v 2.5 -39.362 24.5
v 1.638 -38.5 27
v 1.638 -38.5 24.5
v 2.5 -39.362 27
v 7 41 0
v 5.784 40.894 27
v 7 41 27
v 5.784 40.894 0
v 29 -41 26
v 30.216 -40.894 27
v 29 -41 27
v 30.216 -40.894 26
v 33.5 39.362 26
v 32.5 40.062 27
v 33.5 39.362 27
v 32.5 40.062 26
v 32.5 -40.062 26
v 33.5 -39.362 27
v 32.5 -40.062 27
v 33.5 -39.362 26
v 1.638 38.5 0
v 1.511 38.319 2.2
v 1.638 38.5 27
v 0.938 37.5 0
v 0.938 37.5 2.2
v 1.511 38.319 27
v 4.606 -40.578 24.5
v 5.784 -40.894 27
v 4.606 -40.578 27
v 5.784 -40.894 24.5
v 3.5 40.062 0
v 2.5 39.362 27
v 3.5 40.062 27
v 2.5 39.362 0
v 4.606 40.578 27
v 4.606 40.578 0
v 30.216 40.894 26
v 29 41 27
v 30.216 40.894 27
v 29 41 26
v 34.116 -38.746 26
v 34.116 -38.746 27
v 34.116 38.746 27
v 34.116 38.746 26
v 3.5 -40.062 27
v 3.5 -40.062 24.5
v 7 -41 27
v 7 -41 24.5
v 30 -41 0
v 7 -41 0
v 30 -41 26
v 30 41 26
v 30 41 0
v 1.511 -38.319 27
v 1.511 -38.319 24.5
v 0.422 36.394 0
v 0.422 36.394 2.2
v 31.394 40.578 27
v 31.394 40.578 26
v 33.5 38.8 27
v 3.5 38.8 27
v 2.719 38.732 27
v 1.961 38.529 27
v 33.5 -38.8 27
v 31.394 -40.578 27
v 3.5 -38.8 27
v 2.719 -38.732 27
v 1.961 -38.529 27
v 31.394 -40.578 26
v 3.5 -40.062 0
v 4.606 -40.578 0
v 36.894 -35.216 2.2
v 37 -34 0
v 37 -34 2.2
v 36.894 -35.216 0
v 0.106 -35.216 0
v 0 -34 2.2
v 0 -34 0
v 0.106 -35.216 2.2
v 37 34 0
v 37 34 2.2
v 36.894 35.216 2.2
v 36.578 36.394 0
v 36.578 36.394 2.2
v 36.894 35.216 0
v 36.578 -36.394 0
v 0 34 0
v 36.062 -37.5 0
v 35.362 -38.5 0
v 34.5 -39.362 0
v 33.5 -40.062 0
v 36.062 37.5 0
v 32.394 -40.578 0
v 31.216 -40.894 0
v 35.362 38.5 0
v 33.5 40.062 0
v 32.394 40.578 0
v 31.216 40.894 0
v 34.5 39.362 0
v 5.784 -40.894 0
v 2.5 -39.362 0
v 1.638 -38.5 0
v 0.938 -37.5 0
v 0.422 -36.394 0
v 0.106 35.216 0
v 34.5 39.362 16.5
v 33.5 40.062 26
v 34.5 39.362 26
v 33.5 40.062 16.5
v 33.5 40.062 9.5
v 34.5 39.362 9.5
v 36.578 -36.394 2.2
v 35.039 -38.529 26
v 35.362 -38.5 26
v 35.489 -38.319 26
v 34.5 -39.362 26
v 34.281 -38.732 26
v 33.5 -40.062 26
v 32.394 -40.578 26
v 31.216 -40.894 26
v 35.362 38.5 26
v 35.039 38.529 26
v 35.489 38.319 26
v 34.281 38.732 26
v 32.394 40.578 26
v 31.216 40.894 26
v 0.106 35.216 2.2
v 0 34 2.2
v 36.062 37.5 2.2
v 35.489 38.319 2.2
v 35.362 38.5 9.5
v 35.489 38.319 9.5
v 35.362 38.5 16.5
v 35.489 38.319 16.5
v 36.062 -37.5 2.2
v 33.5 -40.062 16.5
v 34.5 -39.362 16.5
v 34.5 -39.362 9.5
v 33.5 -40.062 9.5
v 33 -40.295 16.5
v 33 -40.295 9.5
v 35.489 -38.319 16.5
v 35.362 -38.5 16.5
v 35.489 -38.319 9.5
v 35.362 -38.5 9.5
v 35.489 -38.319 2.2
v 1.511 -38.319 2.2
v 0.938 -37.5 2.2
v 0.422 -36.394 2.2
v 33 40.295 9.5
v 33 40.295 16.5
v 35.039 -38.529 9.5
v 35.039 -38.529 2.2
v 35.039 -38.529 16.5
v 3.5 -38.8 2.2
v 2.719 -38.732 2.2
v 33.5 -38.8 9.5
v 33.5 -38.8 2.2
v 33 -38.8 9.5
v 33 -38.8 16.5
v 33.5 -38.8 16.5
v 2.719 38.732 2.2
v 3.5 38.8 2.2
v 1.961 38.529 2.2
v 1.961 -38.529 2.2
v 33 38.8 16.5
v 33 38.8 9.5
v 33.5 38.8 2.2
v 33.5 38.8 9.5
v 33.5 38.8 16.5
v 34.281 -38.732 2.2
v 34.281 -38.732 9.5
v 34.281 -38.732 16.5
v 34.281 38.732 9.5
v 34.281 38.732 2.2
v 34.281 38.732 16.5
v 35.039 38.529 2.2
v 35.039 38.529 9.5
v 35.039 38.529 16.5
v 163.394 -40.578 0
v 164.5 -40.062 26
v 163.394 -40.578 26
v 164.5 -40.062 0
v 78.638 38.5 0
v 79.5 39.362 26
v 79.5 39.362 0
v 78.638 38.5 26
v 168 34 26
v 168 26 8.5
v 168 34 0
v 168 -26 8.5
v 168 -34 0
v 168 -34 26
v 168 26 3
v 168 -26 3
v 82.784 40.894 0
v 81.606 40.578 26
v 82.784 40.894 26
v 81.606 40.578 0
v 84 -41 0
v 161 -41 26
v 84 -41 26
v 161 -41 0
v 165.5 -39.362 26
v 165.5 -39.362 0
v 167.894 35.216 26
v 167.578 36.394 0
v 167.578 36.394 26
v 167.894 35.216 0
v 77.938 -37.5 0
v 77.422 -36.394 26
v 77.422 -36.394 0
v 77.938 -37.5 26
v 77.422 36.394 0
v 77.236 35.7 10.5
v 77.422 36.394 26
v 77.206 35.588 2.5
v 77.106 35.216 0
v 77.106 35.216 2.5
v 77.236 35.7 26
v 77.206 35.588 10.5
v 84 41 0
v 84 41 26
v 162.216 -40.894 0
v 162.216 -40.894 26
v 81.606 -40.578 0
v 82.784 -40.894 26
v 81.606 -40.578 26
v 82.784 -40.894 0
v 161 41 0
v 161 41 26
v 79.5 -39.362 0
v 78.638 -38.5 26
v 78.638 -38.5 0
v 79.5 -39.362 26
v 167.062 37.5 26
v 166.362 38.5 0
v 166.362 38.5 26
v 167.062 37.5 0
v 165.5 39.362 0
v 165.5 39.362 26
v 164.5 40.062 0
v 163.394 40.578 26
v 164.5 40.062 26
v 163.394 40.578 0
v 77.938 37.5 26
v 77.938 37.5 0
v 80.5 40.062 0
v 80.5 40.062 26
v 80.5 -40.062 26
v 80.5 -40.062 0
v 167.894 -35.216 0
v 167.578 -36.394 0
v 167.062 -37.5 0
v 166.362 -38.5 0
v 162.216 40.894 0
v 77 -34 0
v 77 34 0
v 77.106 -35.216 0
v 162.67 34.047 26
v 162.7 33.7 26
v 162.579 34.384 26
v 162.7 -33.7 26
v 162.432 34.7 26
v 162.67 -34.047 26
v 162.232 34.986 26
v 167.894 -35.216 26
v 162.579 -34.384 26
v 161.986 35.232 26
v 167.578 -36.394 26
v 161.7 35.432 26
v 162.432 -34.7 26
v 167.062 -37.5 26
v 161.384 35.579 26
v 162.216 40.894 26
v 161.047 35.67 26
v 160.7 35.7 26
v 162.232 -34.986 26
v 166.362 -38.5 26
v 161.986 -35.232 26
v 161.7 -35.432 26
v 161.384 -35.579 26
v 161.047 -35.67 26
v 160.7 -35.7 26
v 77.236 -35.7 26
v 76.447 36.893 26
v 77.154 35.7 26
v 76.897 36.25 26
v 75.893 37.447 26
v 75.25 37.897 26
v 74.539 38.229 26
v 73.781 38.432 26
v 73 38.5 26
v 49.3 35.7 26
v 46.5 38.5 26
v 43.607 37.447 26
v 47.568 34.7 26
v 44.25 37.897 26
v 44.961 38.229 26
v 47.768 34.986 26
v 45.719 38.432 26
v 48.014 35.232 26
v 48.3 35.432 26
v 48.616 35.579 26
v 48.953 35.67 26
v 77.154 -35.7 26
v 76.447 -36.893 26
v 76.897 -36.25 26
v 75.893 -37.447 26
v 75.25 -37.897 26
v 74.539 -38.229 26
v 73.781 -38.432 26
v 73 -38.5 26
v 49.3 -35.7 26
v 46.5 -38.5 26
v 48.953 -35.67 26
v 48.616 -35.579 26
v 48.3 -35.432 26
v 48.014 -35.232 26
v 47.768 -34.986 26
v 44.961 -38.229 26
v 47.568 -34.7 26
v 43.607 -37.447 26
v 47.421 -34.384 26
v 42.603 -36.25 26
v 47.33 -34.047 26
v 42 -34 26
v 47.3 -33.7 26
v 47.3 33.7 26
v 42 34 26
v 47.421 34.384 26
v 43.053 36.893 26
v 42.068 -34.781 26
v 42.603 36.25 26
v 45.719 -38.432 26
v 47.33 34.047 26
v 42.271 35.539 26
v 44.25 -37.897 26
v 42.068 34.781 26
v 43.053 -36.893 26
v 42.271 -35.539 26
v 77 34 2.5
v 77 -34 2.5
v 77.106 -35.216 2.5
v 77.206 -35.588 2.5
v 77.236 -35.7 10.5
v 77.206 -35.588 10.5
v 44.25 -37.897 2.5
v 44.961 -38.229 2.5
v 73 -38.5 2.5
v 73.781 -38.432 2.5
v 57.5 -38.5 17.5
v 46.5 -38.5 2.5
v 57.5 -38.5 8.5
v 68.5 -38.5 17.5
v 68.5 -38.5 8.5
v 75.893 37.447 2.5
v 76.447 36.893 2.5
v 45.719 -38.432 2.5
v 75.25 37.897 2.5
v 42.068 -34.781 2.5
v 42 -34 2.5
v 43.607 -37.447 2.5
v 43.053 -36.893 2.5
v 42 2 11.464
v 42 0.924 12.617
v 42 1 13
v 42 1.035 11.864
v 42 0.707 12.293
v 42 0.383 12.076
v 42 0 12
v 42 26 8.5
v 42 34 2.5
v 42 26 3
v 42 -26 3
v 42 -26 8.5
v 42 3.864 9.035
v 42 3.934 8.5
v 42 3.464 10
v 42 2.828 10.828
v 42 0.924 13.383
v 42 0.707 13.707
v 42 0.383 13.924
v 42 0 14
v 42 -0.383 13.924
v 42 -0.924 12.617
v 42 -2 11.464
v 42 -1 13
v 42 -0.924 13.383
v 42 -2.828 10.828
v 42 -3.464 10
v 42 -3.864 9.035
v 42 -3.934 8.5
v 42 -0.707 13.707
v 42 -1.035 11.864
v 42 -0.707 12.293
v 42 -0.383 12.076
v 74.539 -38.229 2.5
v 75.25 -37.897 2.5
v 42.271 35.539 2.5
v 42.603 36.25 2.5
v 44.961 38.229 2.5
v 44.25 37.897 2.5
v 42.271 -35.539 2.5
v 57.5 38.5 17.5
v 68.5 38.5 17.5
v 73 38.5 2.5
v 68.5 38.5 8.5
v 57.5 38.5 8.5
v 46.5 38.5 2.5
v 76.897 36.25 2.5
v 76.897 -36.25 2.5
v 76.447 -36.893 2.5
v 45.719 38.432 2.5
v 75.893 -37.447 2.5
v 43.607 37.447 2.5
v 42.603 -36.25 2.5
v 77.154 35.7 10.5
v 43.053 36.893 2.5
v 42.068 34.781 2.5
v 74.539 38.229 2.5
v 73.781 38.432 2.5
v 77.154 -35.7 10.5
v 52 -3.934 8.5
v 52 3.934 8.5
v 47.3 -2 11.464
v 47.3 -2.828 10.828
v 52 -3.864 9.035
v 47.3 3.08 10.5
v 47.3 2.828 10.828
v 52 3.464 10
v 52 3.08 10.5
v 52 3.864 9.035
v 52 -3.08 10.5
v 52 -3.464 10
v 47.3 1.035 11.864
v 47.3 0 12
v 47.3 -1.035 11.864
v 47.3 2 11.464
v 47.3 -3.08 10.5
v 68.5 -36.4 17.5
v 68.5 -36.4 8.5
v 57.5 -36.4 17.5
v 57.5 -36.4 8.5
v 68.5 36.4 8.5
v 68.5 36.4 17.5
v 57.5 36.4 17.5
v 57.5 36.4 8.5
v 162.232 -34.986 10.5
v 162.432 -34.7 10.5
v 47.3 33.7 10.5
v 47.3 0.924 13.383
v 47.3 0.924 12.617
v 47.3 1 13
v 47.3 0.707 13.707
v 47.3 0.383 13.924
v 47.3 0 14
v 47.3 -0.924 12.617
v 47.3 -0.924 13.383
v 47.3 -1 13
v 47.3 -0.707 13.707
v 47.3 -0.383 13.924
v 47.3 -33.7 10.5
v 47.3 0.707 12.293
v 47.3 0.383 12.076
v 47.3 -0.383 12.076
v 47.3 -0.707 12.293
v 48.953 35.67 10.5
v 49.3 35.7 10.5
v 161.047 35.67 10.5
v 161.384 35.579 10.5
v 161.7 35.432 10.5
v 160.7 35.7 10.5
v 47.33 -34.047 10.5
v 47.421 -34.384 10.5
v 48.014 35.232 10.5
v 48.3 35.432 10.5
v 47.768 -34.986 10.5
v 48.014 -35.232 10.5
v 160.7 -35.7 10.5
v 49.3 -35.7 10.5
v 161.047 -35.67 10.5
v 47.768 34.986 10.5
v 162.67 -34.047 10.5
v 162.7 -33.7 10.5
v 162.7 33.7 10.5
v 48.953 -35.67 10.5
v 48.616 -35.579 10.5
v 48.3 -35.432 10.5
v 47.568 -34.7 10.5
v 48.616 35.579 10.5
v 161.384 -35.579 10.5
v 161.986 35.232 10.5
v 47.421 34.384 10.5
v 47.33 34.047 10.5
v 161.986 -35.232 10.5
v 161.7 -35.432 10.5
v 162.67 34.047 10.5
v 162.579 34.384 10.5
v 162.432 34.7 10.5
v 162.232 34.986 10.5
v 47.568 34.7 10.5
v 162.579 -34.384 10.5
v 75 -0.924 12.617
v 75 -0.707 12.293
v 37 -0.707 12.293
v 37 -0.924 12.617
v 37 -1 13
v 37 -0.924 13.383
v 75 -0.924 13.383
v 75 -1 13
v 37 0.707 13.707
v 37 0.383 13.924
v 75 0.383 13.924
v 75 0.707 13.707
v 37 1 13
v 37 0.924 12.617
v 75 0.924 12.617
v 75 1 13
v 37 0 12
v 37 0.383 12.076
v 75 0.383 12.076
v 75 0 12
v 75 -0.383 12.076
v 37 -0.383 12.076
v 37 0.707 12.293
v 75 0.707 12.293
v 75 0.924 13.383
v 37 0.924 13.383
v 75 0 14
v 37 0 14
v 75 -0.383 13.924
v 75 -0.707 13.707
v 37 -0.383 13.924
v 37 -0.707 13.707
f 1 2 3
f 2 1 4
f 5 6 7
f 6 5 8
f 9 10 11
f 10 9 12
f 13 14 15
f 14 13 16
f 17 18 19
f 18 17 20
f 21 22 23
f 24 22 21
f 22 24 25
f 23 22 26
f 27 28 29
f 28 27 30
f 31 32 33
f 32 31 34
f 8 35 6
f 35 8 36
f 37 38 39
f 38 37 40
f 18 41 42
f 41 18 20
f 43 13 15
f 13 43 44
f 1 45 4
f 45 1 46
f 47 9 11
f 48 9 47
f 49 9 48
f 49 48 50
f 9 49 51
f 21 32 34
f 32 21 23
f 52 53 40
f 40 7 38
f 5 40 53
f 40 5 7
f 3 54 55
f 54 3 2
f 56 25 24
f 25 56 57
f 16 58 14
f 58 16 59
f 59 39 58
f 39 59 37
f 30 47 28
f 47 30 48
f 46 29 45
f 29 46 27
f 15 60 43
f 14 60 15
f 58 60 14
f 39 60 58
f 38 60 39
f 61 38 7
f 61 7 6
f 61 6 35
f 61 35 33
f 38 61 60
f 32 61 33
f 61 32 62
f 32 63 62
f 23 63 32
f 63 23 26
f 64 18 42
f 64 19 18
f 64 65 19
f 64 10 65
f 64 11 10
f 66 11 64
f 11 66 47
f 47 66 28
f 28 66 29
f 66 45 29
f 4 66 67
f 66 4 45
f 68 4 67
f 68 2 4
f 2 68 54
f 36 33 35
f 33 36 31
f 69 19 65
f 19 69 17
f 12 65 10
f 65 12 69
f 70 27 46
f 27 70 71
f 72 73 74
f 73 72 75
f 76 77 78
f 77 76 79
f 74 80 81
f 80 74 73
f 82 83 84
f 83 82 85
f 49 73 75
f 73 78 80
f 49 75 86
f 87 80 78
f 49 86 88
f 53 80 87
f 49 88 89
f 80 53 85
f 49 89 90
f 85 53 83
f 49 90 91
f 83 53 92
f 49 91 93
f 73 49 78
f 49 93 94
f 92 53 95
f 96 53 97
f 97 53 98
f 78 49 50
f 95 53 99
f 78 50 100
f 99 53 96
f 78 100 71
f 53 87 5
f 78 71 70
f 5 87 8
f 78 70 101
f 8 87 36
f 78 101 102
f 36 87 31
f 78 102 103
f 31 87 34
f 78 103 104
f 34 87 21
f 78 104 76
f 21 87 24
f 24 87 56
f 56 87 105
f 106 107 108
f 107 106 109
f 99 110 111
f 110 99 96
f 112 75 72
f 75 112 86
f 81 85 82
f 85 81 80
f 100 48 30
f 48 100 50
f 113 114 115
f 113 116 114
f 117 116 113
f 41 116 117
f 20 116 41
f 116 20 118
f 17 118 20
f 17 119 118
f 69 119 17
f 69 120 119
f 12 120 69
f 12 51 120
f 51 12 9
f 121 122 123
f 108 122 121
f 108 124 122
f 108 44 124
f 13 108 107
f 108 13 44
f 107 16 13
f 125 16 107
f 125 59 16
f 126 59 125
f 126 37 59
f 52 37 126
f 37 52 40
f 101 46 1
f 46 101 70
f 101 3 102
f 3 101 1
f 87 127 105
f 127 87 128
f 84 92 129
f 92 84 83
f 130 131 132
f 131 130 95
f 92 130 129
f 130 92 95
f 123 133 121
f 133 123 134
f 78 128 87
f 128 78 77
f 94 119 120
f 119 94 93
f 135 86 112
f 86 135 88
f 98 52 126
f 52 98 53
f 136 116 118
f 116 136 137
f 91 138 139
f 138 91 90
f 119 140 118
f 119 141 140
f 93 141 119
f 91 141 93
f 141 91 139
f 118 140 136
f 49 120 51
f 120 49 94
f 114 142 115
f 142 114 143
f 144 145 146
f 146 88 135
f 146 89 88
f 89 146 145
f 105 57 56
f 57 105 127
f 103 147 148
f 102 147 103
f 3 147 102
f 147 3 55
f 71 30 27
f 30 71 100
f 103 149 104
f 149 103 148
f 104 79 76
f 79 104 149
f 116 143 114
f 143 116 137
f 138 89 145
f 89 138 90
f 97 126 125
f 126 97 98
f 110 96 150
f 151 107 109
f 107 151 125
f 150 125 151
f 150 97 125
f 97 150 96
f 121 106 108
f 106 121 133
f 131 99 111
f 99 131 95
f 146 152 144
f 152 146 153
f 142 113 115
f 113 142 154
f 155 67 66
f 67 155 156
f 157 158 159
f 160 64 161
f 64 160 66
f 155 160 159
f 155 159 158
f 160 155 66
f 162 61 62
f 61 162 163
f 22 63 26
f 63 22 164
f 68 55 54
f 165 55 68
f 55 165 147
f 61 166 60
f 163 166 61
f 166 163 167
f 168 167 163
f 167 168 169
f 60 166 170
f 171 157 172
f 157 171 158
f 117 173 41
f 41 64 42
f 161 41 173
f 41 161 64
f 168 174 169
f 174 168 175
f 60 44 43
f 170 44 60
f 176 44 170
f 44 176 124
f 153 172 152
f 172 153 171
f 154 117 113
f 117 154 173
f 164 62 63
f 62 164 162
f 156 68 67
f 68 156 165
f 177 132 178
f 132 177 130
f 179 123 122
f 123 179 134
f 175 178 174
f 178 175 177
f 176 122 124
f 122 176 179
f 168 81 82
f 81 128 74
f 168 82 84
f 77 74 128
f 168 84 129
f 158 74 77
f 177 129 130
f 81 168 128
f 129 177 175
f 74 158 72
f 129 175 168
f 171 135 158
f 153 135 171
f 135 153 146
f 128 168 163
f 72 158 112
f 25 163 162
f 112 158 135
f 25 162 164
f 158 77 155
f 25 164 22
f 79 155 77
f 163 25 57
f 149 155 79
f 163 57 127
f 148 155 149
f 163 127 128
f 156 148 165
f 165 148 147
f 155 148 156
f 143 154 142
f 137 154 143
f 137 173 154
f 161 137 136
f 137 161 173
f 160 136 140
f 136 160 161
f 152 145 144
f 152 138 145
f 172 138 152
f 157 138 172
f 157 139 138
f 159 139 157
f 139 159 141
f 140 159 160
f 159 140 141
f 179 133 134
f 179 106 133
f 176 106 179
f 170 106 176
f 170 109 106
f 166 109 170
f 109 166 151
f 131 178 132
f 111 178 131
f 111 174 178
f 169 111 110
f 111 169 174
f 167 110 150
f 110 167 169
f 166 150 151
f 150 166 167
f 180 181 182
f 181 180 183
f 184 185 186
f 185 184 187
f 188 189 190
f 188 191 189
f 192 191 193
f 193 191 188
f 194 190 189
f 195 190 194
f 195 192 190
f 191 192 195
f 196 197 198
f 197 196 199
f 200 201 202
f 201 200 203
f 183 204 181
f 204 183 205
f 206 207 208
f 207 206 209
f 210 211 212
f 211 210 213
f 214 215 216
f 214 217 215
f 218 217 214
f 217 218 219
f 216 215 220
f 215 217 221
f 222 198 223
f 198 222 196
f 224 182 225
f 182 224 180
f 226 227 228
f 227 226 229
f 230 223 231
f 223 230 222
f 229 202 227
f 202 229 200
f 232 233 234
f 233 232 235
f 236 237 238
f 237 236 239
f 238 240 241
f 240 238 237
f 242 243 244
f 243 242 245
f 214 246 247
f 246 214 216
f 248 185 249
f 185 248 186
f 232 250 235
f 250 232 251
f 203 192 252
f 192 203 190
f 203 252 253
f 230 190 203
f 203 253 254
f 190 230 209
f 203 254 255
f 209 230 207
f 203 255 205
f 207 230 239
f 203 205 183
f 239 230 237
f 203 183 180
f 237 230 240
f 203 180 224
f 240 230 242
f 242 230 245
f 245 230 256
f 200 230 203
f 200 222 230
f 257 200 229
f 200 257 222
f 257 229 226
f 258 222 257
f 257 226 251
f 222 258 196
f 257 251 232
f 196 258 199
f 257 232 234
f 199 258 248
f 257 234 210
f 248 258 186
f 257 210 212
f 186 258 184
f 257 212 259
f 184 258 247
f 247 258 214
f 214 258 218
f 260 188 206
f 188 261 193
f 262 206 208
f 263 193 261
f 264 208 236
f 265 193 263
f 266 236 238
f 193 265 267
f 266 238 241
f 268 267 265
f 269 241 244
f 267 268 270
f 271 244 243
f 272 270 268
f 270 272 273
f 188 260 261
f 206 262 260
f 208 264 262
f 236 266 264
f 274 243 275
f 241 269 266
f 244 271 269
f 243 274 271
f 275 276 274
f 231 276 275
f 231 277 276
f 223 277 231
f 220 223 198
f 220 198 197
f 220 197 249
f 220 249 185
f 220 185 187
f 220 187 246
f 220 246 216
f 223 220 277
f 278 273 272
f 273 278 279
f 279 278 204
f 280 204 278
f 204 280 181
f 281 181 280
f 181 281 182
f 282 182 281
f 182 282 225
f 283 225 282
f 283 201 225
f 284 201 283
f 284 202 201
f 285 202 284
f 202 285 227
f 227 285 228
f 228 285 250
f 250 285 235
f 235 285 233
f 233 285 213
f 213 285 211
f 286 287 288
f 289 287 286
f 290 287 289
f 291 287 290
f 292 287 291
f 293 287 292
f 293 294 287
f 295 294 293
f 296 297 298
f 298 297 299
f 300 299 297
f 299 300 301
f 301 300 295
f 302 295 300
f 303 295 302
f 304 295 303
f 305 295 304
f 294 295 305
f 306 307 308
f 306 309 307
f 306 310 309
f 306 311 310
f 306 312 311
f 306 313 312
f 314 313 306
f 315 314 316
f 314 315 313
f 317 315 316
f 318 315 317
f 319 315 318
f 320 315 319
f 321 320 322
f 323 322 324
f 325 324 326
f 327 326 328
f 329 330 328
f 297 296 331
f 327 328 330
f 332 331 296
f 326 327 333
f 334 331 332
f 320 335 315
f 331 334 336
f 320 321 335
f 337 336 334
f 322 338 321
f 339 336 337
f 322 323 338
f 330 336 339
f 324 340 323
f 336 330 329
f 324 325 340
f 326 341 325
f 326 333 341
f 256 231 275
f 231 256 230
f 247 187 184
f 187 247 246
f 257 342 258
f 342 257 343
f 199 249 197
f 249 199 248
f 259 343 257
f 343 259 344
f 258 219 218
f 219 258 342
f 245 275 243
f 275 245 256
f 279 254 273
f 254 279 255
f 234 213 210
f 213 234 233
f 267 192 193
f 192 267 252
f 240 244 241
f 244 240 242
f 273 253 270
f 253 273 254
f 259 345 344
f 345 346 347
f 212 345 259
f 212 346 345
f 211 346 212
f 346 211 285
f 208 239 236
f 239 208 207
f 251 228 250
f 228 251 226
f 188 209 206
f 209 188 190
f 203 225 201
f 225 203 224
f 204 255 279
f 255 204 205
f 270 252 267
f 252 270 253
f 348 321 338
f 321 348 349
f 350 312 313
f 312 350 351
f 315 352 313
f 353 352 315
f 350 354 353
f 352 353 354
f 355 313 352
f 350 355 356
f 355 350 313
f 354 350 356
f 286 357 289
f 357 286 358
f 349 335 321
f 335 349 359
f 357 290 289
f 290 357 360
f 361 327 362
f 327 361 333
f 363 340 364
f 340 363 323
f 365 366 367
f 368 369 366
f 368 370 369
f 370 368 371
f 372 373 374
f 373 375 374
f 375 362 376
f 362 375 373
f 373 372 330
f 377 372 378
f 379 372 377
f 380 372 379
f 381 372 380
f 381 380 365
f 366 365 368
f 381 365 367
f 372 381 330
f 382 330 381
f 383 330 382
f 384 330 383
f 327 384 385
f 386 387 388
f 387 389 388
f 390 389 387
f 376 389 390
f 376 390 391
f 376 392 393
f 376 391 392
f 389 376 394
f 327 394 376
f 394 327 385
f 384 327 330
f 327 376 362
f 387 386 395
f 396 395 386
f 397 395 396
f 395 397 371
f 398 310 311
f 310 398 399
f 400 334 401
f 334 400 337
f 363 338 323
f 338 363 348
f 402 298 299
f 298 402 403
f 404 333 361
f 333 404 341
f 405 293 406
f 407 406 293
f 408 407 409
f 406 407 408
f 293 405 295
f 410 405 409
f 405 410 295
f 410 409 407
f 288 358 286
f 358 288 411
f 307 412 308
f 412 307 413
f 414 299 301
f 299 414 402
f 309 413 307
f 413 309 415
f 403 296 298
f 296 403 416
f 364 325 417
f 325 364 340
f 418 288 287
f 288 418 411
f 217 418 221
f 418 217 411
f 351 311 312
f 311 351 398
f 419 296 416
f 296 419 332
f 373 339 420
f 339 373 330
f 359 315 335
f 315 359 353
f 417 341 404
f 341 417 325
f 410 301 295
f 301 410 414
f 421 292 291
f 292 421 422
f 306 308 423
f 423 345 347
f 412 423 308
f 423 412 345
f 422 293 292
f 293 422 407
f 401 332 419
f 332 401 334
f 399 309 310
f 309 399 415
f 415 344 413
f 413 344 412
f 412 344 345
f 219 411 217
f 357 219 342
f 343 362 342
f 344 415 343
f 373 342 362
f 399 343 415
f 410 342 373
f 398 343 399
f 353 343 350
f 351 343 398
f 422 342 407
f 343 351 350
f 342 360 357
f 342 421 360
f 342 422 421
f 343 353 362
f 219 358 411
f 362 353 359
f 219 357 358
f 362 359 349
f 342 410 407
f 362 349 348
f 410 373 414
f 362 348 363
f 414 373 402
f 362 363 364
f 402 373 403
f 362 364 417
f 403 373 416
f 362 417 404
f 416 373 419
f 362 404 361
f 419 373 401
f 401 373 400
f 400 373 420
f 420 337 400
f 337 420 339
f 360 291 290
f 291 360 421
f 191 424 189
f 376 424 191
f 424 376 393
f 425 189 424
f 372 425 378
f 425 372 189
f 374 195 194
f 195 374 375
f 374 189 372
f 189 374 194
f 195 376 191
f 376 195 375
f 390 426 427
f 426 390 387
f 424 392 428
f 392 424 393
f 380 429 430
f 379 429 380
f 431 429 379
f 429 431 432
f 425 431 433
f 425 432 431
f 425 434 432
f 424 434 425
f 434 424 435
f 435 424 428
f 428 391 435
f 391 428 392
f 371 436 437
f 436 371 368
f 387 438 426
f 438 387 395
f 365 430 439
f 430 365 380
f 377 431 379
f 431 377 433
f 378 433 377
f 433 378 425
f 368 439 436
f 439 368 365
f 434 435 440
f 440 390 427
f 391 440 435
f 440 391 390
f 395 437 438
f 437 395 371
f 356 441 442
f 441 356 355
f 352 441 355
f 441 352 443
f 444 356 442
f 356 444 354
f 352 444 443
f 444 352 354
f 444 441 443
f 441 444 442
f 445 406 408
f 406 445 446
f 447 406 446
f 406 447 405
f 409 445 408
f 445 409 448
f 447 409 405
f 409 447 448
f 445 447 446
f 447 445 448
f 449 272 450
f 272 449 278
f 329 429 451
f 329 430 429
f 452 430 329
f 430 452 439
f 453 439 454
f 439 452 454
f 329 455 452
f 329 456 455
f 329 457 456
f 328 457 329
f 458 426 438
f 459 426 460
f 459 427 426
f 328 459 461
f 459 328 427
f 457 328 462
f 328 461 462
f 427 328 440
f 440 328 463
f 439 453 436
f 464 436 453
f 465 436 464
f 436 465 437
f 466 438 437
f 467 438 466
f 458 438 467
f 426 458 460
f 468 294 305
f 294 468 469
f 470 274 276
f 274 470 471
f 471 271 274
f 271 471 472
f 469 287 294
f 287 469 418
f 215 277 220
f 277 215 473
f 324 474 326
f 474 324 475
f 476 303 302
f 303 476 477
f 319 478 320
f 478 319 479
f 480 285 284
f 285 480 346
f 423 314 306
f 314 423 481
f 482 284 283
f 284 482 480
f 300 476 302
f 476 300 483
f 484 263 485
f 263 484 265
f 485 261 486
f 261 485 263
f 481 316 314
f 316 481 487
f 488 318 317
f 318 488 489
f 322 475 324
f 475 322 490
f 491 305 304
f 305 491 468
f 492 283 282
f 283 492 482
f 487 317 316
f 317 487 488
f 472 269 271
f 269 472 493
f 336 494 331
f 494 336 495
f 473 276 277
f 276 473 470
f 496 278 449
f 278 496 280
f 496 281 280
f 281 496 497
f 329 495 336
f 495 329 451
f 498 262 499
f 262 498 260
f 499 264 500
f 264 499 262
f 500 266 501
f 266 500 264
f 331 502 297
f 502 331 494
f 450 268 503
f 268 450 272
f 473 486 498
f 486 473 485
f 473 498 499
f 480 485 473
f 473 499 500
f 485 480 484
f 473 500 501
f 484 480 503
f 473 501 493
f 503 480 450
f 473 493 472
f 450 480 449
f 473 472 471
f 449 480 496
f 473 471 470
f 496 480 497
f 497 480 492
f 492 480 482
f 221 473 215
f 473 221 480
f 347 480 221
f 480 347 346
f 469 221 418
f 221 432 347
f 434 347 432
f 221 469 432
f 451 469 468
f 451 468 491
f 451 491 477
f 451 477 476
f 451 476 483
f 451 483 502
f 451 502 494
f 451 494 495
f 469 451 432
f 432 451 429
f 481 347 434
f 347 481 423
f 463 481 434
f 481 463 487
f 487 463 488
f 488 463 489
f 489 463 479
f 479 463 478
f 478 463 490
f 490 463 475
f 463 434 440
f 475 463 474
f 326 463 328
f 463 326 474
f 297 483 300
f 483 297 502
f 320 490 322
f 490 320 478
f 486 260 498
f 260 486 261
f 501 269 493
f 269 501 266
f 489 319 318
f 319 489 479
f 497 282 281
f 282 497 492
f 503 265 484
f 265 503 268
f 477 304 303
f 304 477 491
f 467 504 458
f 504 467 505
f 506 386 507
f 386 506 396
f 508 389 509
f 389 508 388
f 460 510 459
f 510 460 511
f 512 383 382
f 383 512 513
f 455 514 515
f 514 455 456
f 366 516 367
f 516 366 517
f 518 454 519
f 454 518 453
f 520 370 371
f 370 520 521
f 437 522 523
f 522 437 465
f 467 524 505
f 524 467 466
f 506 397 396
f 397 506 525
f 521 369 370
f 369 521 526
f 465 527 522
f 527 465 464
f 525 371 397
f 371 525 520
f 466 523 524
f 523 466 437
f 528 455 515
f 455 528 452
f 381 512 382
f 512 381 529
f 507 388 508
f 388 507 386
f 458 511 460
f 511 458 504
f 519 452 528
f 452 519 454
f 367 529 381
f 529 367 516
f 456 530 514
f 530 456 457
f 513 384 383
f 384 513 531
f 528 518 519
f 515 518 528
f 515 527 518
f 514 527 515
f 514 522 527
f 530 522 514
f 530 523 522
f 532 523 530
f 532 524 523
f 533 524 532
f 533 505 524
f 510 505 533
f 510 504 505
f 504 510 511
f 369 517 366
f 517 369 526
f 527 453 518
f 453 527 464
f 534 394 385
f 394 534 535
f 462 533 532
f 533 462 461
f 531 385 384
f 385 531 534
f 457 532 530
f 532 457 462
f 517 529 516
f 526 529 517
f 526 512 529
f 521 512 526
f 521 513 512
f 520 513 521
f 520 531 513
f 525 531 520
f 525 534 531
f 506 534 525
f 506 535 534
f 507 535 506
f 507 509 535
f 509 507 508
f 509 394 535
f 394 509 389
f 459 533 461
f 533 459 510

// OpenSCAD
$fn = 36;

// Parámetros de la cápsula
pod_l = 126.0;
pod_w = 82.0;
pod_base_h = 26.0;
pod_r = 7.0;
pod_wall = 2.8;

// Parámetros de la cuna TPU
cradle_depth = 35.0;
cradle_wall = 2.5;
cradle_floor = 2.5;
cradle_tol = 0.3; // Holgura precisa para TPU sobre ASA

// Parámetros del Click / Snap-Fit
click_x = 16.0;      // Posición a lo largo del bolsillo (mm)
click_l = 10.0;      // Largo del diente en X (mm)
click_h = 8.0;       // Altura del diente en Z (mm)
click_depth = 1.8;   // Saliente del diente de traba hacia adentro (mm)
click_z = 13.0;      // Centrado verticalmente a media altura

// Túnel pasacorreas
strap_slot_w = 52.0;
strap_slot_h = 5.5;
tunnel_t = 3.0;

module r_box(l, w, h, r) {
    hull() {
        translate([r, r, 0]) cylinder(r=r, h=h);
        translate([l-r, r, 0]) cylinder(r=r, h=h);
        translate([r, w-r, 0]) cylinder(r=r, h=h);
        translate([l-r, w-r, 0]) cylinder(r=r, h=h);
    }
}

// Diente de traba en cuña (Entrada suave en rampa hacia X=0, tope recto anti-extracción)
module snap_wedge() {
    hull() {
        // Cara trasera de retención recta (tope en X=0 local)
        translate([0, 0, -click_h/2])
            cube([0.5, click_depth, click_h]);
        // Cima redondeada del diente de traba
        translate([2.5, click_depth - 0.4, -click_h/2])
            cube([1.0, 0.4, click_h]);
        // Rampa suave hacia la boca de entrada (en X=click_l)
        translate([click_l, 0, -click_h/2 + 0.5])
            cube([0.5, 0.3, click_h - 1.0]);
    }
}

// CUNA EN TPU CON DIENTES DE CLICK Y LABIO TIPO FUNDA DE CELULAR
module tpu_cradle_snap_fit() {
    color([0.18, 0.20, 0.22]) // TPU Grafito
    difference() {
        union() {
            // Cuerpo exterior de la cuna
            translate([0, -pod_w/2, 0])
                r_box(cradle_depth + 2.0, pod_w, pod_base_h, pod_r);

            // Labio superior elástico tipo funda de celular (sujeta el borde superior del case)
            translate([0, -pod_w/2, pod_base_h - 1.5]) {
                difference() {
                    r_box(cradle_depth + 1.0, pod_w, 2.5, pod_r);
                    translate([-2, cradle_wall + 1.2, -1])
                        r_box(cradle_depth + 5.0, pod_w - 2*(cradle_wall + 1.2), 5.0, max(1, pod_r - cradle_wall));
                }
            }

            // Dientes de click interiores en las paredes laterales de TPU
            // Diente lateral 1 (en pared Y = -pod_w/2 + cradle_wall)
            translate([click_x, -pod_w/2 + cradle_wall - cradle_tol, click_z])
                snap_wedge();

            // Diente lateral 2 (en pared Y = +pod_w/2 - cradle_wall)
            translate([click_x, pod_w/2 - cradle_wall + cradle_tol, click_z])
                mirror([0, 1, 0]) snap_wedge();
        }

        // Cavidad interior donde entra el case
        translate([-1.0, -pod_w/2 + cradle_wall - cradle_tol, cradle_floor - cradle_tol])
            r_box(cradle_depth + 4.0, pod_w - 2*(cradle_wall - cradle_tol), 
                  pod_base_h + 5.0, max(1, pod_r - cradle_wall));

        // Túnel pasacorreas continuo
        translate([-5, -strap_slot_w/2, tunnel_t])
            cube([cradle_depth + 10, strap_slot_w, strap_slot_h]);

        // Pasacables hacia el puente
        translate([-5, 0, 8.0])
            rotate([0, 90, 0]) cylinder(r=4.0, h=15, $fn=24);

        // Muescas para desenganche con los dedos (para liberar el click si se desea)
        translate([cradle_depth - 2.0, -pod_w/2 - 1.0, click_z - 3.5])
            cube([5.0, cradle_wall + 2.0, 7.0]);
        translate([cradle_depth - 2.0, pod_w/2 - cradle_wall - 1.0, click_z - 3.5])
            cube([5.0, cradle_wall + 2.0, 7.0]);
    }
}

// BASE RÍGIDA ASA CON MUESCAS DE TRABA (CLICK DETENT)
module asa_pod_snap_fit() {
    color([0.94, 0.42, 0.12]) // ASA Naranja
    difference() {
        union() {
            // Cuerpo principal a tamaño completo
            translate([cradle_depth, 0, 0])
                r_box(pod_l - cradle_depth, pod_w, pod_base_h, pod_r);
            
            // Lengüeta rebajada macho
            translate([0, cradle_wall, cradle_floor])
                r_box(cradle_depth + 0.5, pod_w - 2*cradle_wall, pod_base_h - cradle_floor, max(1, pod_r - cradle_wall));
        }

        // Túnel pasacorreas
        translate([-5, (pod_w - strap_slot_w)/2, tunnel_t])
            cube([pod_l + 10, strap_slot_w, strap_slot_h]);

        // Pasacables frontal
        translate([-5, pod_w/2, 8.0])
            rotate([0, 90, 0]) cylinder(r=4.0, h=15, $fn=24);

        // MUESCA / CANAL DE CLICK LATERAL 1
        translate([click_x - 0.5, cradle_wall - 0.2, click_z - click_h/2 - 0.5]) {
            cube([click_l + 1.0, click_depth + 0.5, click_h + 1.0]);
        }

        // MUESCA / CANAL DE CLICK LATERAL 2
        translate([click_x - 0.5, pod_w - cradle_wall - click_depth - 0.3, click_z - click_h/2 - 0.5]) {
            cube([click_l + 1.0, click_depth + 0.5, click_h + 1.0]);
        }

        // Vaciado interior de la caja
        translate([cradle_wall + pod_wall, cradle_wall + pod_wall, tunnel_t + strap_slot_h + 2.0])
            r_box(pod_l - 2*(cradle_wall + pod_wall), pod_w - 2*(cradle_wall + pod_wall), pod_base_h + 5, 2.0);
    }
}

// Vista explosionada
tpu_cradle_snap_fit();
translate([42, -pod_w/2, 0]) asa_pod_snap_fit();

// Flechas indicadoras de ensamble
color([0.2, 0.8, 1.0]) {
    translate([cradle_depth + 2, 0, click_z])
        rotate([0, 90, 0]) cylinder(r=1.0, h=38, $fn=16);
}
